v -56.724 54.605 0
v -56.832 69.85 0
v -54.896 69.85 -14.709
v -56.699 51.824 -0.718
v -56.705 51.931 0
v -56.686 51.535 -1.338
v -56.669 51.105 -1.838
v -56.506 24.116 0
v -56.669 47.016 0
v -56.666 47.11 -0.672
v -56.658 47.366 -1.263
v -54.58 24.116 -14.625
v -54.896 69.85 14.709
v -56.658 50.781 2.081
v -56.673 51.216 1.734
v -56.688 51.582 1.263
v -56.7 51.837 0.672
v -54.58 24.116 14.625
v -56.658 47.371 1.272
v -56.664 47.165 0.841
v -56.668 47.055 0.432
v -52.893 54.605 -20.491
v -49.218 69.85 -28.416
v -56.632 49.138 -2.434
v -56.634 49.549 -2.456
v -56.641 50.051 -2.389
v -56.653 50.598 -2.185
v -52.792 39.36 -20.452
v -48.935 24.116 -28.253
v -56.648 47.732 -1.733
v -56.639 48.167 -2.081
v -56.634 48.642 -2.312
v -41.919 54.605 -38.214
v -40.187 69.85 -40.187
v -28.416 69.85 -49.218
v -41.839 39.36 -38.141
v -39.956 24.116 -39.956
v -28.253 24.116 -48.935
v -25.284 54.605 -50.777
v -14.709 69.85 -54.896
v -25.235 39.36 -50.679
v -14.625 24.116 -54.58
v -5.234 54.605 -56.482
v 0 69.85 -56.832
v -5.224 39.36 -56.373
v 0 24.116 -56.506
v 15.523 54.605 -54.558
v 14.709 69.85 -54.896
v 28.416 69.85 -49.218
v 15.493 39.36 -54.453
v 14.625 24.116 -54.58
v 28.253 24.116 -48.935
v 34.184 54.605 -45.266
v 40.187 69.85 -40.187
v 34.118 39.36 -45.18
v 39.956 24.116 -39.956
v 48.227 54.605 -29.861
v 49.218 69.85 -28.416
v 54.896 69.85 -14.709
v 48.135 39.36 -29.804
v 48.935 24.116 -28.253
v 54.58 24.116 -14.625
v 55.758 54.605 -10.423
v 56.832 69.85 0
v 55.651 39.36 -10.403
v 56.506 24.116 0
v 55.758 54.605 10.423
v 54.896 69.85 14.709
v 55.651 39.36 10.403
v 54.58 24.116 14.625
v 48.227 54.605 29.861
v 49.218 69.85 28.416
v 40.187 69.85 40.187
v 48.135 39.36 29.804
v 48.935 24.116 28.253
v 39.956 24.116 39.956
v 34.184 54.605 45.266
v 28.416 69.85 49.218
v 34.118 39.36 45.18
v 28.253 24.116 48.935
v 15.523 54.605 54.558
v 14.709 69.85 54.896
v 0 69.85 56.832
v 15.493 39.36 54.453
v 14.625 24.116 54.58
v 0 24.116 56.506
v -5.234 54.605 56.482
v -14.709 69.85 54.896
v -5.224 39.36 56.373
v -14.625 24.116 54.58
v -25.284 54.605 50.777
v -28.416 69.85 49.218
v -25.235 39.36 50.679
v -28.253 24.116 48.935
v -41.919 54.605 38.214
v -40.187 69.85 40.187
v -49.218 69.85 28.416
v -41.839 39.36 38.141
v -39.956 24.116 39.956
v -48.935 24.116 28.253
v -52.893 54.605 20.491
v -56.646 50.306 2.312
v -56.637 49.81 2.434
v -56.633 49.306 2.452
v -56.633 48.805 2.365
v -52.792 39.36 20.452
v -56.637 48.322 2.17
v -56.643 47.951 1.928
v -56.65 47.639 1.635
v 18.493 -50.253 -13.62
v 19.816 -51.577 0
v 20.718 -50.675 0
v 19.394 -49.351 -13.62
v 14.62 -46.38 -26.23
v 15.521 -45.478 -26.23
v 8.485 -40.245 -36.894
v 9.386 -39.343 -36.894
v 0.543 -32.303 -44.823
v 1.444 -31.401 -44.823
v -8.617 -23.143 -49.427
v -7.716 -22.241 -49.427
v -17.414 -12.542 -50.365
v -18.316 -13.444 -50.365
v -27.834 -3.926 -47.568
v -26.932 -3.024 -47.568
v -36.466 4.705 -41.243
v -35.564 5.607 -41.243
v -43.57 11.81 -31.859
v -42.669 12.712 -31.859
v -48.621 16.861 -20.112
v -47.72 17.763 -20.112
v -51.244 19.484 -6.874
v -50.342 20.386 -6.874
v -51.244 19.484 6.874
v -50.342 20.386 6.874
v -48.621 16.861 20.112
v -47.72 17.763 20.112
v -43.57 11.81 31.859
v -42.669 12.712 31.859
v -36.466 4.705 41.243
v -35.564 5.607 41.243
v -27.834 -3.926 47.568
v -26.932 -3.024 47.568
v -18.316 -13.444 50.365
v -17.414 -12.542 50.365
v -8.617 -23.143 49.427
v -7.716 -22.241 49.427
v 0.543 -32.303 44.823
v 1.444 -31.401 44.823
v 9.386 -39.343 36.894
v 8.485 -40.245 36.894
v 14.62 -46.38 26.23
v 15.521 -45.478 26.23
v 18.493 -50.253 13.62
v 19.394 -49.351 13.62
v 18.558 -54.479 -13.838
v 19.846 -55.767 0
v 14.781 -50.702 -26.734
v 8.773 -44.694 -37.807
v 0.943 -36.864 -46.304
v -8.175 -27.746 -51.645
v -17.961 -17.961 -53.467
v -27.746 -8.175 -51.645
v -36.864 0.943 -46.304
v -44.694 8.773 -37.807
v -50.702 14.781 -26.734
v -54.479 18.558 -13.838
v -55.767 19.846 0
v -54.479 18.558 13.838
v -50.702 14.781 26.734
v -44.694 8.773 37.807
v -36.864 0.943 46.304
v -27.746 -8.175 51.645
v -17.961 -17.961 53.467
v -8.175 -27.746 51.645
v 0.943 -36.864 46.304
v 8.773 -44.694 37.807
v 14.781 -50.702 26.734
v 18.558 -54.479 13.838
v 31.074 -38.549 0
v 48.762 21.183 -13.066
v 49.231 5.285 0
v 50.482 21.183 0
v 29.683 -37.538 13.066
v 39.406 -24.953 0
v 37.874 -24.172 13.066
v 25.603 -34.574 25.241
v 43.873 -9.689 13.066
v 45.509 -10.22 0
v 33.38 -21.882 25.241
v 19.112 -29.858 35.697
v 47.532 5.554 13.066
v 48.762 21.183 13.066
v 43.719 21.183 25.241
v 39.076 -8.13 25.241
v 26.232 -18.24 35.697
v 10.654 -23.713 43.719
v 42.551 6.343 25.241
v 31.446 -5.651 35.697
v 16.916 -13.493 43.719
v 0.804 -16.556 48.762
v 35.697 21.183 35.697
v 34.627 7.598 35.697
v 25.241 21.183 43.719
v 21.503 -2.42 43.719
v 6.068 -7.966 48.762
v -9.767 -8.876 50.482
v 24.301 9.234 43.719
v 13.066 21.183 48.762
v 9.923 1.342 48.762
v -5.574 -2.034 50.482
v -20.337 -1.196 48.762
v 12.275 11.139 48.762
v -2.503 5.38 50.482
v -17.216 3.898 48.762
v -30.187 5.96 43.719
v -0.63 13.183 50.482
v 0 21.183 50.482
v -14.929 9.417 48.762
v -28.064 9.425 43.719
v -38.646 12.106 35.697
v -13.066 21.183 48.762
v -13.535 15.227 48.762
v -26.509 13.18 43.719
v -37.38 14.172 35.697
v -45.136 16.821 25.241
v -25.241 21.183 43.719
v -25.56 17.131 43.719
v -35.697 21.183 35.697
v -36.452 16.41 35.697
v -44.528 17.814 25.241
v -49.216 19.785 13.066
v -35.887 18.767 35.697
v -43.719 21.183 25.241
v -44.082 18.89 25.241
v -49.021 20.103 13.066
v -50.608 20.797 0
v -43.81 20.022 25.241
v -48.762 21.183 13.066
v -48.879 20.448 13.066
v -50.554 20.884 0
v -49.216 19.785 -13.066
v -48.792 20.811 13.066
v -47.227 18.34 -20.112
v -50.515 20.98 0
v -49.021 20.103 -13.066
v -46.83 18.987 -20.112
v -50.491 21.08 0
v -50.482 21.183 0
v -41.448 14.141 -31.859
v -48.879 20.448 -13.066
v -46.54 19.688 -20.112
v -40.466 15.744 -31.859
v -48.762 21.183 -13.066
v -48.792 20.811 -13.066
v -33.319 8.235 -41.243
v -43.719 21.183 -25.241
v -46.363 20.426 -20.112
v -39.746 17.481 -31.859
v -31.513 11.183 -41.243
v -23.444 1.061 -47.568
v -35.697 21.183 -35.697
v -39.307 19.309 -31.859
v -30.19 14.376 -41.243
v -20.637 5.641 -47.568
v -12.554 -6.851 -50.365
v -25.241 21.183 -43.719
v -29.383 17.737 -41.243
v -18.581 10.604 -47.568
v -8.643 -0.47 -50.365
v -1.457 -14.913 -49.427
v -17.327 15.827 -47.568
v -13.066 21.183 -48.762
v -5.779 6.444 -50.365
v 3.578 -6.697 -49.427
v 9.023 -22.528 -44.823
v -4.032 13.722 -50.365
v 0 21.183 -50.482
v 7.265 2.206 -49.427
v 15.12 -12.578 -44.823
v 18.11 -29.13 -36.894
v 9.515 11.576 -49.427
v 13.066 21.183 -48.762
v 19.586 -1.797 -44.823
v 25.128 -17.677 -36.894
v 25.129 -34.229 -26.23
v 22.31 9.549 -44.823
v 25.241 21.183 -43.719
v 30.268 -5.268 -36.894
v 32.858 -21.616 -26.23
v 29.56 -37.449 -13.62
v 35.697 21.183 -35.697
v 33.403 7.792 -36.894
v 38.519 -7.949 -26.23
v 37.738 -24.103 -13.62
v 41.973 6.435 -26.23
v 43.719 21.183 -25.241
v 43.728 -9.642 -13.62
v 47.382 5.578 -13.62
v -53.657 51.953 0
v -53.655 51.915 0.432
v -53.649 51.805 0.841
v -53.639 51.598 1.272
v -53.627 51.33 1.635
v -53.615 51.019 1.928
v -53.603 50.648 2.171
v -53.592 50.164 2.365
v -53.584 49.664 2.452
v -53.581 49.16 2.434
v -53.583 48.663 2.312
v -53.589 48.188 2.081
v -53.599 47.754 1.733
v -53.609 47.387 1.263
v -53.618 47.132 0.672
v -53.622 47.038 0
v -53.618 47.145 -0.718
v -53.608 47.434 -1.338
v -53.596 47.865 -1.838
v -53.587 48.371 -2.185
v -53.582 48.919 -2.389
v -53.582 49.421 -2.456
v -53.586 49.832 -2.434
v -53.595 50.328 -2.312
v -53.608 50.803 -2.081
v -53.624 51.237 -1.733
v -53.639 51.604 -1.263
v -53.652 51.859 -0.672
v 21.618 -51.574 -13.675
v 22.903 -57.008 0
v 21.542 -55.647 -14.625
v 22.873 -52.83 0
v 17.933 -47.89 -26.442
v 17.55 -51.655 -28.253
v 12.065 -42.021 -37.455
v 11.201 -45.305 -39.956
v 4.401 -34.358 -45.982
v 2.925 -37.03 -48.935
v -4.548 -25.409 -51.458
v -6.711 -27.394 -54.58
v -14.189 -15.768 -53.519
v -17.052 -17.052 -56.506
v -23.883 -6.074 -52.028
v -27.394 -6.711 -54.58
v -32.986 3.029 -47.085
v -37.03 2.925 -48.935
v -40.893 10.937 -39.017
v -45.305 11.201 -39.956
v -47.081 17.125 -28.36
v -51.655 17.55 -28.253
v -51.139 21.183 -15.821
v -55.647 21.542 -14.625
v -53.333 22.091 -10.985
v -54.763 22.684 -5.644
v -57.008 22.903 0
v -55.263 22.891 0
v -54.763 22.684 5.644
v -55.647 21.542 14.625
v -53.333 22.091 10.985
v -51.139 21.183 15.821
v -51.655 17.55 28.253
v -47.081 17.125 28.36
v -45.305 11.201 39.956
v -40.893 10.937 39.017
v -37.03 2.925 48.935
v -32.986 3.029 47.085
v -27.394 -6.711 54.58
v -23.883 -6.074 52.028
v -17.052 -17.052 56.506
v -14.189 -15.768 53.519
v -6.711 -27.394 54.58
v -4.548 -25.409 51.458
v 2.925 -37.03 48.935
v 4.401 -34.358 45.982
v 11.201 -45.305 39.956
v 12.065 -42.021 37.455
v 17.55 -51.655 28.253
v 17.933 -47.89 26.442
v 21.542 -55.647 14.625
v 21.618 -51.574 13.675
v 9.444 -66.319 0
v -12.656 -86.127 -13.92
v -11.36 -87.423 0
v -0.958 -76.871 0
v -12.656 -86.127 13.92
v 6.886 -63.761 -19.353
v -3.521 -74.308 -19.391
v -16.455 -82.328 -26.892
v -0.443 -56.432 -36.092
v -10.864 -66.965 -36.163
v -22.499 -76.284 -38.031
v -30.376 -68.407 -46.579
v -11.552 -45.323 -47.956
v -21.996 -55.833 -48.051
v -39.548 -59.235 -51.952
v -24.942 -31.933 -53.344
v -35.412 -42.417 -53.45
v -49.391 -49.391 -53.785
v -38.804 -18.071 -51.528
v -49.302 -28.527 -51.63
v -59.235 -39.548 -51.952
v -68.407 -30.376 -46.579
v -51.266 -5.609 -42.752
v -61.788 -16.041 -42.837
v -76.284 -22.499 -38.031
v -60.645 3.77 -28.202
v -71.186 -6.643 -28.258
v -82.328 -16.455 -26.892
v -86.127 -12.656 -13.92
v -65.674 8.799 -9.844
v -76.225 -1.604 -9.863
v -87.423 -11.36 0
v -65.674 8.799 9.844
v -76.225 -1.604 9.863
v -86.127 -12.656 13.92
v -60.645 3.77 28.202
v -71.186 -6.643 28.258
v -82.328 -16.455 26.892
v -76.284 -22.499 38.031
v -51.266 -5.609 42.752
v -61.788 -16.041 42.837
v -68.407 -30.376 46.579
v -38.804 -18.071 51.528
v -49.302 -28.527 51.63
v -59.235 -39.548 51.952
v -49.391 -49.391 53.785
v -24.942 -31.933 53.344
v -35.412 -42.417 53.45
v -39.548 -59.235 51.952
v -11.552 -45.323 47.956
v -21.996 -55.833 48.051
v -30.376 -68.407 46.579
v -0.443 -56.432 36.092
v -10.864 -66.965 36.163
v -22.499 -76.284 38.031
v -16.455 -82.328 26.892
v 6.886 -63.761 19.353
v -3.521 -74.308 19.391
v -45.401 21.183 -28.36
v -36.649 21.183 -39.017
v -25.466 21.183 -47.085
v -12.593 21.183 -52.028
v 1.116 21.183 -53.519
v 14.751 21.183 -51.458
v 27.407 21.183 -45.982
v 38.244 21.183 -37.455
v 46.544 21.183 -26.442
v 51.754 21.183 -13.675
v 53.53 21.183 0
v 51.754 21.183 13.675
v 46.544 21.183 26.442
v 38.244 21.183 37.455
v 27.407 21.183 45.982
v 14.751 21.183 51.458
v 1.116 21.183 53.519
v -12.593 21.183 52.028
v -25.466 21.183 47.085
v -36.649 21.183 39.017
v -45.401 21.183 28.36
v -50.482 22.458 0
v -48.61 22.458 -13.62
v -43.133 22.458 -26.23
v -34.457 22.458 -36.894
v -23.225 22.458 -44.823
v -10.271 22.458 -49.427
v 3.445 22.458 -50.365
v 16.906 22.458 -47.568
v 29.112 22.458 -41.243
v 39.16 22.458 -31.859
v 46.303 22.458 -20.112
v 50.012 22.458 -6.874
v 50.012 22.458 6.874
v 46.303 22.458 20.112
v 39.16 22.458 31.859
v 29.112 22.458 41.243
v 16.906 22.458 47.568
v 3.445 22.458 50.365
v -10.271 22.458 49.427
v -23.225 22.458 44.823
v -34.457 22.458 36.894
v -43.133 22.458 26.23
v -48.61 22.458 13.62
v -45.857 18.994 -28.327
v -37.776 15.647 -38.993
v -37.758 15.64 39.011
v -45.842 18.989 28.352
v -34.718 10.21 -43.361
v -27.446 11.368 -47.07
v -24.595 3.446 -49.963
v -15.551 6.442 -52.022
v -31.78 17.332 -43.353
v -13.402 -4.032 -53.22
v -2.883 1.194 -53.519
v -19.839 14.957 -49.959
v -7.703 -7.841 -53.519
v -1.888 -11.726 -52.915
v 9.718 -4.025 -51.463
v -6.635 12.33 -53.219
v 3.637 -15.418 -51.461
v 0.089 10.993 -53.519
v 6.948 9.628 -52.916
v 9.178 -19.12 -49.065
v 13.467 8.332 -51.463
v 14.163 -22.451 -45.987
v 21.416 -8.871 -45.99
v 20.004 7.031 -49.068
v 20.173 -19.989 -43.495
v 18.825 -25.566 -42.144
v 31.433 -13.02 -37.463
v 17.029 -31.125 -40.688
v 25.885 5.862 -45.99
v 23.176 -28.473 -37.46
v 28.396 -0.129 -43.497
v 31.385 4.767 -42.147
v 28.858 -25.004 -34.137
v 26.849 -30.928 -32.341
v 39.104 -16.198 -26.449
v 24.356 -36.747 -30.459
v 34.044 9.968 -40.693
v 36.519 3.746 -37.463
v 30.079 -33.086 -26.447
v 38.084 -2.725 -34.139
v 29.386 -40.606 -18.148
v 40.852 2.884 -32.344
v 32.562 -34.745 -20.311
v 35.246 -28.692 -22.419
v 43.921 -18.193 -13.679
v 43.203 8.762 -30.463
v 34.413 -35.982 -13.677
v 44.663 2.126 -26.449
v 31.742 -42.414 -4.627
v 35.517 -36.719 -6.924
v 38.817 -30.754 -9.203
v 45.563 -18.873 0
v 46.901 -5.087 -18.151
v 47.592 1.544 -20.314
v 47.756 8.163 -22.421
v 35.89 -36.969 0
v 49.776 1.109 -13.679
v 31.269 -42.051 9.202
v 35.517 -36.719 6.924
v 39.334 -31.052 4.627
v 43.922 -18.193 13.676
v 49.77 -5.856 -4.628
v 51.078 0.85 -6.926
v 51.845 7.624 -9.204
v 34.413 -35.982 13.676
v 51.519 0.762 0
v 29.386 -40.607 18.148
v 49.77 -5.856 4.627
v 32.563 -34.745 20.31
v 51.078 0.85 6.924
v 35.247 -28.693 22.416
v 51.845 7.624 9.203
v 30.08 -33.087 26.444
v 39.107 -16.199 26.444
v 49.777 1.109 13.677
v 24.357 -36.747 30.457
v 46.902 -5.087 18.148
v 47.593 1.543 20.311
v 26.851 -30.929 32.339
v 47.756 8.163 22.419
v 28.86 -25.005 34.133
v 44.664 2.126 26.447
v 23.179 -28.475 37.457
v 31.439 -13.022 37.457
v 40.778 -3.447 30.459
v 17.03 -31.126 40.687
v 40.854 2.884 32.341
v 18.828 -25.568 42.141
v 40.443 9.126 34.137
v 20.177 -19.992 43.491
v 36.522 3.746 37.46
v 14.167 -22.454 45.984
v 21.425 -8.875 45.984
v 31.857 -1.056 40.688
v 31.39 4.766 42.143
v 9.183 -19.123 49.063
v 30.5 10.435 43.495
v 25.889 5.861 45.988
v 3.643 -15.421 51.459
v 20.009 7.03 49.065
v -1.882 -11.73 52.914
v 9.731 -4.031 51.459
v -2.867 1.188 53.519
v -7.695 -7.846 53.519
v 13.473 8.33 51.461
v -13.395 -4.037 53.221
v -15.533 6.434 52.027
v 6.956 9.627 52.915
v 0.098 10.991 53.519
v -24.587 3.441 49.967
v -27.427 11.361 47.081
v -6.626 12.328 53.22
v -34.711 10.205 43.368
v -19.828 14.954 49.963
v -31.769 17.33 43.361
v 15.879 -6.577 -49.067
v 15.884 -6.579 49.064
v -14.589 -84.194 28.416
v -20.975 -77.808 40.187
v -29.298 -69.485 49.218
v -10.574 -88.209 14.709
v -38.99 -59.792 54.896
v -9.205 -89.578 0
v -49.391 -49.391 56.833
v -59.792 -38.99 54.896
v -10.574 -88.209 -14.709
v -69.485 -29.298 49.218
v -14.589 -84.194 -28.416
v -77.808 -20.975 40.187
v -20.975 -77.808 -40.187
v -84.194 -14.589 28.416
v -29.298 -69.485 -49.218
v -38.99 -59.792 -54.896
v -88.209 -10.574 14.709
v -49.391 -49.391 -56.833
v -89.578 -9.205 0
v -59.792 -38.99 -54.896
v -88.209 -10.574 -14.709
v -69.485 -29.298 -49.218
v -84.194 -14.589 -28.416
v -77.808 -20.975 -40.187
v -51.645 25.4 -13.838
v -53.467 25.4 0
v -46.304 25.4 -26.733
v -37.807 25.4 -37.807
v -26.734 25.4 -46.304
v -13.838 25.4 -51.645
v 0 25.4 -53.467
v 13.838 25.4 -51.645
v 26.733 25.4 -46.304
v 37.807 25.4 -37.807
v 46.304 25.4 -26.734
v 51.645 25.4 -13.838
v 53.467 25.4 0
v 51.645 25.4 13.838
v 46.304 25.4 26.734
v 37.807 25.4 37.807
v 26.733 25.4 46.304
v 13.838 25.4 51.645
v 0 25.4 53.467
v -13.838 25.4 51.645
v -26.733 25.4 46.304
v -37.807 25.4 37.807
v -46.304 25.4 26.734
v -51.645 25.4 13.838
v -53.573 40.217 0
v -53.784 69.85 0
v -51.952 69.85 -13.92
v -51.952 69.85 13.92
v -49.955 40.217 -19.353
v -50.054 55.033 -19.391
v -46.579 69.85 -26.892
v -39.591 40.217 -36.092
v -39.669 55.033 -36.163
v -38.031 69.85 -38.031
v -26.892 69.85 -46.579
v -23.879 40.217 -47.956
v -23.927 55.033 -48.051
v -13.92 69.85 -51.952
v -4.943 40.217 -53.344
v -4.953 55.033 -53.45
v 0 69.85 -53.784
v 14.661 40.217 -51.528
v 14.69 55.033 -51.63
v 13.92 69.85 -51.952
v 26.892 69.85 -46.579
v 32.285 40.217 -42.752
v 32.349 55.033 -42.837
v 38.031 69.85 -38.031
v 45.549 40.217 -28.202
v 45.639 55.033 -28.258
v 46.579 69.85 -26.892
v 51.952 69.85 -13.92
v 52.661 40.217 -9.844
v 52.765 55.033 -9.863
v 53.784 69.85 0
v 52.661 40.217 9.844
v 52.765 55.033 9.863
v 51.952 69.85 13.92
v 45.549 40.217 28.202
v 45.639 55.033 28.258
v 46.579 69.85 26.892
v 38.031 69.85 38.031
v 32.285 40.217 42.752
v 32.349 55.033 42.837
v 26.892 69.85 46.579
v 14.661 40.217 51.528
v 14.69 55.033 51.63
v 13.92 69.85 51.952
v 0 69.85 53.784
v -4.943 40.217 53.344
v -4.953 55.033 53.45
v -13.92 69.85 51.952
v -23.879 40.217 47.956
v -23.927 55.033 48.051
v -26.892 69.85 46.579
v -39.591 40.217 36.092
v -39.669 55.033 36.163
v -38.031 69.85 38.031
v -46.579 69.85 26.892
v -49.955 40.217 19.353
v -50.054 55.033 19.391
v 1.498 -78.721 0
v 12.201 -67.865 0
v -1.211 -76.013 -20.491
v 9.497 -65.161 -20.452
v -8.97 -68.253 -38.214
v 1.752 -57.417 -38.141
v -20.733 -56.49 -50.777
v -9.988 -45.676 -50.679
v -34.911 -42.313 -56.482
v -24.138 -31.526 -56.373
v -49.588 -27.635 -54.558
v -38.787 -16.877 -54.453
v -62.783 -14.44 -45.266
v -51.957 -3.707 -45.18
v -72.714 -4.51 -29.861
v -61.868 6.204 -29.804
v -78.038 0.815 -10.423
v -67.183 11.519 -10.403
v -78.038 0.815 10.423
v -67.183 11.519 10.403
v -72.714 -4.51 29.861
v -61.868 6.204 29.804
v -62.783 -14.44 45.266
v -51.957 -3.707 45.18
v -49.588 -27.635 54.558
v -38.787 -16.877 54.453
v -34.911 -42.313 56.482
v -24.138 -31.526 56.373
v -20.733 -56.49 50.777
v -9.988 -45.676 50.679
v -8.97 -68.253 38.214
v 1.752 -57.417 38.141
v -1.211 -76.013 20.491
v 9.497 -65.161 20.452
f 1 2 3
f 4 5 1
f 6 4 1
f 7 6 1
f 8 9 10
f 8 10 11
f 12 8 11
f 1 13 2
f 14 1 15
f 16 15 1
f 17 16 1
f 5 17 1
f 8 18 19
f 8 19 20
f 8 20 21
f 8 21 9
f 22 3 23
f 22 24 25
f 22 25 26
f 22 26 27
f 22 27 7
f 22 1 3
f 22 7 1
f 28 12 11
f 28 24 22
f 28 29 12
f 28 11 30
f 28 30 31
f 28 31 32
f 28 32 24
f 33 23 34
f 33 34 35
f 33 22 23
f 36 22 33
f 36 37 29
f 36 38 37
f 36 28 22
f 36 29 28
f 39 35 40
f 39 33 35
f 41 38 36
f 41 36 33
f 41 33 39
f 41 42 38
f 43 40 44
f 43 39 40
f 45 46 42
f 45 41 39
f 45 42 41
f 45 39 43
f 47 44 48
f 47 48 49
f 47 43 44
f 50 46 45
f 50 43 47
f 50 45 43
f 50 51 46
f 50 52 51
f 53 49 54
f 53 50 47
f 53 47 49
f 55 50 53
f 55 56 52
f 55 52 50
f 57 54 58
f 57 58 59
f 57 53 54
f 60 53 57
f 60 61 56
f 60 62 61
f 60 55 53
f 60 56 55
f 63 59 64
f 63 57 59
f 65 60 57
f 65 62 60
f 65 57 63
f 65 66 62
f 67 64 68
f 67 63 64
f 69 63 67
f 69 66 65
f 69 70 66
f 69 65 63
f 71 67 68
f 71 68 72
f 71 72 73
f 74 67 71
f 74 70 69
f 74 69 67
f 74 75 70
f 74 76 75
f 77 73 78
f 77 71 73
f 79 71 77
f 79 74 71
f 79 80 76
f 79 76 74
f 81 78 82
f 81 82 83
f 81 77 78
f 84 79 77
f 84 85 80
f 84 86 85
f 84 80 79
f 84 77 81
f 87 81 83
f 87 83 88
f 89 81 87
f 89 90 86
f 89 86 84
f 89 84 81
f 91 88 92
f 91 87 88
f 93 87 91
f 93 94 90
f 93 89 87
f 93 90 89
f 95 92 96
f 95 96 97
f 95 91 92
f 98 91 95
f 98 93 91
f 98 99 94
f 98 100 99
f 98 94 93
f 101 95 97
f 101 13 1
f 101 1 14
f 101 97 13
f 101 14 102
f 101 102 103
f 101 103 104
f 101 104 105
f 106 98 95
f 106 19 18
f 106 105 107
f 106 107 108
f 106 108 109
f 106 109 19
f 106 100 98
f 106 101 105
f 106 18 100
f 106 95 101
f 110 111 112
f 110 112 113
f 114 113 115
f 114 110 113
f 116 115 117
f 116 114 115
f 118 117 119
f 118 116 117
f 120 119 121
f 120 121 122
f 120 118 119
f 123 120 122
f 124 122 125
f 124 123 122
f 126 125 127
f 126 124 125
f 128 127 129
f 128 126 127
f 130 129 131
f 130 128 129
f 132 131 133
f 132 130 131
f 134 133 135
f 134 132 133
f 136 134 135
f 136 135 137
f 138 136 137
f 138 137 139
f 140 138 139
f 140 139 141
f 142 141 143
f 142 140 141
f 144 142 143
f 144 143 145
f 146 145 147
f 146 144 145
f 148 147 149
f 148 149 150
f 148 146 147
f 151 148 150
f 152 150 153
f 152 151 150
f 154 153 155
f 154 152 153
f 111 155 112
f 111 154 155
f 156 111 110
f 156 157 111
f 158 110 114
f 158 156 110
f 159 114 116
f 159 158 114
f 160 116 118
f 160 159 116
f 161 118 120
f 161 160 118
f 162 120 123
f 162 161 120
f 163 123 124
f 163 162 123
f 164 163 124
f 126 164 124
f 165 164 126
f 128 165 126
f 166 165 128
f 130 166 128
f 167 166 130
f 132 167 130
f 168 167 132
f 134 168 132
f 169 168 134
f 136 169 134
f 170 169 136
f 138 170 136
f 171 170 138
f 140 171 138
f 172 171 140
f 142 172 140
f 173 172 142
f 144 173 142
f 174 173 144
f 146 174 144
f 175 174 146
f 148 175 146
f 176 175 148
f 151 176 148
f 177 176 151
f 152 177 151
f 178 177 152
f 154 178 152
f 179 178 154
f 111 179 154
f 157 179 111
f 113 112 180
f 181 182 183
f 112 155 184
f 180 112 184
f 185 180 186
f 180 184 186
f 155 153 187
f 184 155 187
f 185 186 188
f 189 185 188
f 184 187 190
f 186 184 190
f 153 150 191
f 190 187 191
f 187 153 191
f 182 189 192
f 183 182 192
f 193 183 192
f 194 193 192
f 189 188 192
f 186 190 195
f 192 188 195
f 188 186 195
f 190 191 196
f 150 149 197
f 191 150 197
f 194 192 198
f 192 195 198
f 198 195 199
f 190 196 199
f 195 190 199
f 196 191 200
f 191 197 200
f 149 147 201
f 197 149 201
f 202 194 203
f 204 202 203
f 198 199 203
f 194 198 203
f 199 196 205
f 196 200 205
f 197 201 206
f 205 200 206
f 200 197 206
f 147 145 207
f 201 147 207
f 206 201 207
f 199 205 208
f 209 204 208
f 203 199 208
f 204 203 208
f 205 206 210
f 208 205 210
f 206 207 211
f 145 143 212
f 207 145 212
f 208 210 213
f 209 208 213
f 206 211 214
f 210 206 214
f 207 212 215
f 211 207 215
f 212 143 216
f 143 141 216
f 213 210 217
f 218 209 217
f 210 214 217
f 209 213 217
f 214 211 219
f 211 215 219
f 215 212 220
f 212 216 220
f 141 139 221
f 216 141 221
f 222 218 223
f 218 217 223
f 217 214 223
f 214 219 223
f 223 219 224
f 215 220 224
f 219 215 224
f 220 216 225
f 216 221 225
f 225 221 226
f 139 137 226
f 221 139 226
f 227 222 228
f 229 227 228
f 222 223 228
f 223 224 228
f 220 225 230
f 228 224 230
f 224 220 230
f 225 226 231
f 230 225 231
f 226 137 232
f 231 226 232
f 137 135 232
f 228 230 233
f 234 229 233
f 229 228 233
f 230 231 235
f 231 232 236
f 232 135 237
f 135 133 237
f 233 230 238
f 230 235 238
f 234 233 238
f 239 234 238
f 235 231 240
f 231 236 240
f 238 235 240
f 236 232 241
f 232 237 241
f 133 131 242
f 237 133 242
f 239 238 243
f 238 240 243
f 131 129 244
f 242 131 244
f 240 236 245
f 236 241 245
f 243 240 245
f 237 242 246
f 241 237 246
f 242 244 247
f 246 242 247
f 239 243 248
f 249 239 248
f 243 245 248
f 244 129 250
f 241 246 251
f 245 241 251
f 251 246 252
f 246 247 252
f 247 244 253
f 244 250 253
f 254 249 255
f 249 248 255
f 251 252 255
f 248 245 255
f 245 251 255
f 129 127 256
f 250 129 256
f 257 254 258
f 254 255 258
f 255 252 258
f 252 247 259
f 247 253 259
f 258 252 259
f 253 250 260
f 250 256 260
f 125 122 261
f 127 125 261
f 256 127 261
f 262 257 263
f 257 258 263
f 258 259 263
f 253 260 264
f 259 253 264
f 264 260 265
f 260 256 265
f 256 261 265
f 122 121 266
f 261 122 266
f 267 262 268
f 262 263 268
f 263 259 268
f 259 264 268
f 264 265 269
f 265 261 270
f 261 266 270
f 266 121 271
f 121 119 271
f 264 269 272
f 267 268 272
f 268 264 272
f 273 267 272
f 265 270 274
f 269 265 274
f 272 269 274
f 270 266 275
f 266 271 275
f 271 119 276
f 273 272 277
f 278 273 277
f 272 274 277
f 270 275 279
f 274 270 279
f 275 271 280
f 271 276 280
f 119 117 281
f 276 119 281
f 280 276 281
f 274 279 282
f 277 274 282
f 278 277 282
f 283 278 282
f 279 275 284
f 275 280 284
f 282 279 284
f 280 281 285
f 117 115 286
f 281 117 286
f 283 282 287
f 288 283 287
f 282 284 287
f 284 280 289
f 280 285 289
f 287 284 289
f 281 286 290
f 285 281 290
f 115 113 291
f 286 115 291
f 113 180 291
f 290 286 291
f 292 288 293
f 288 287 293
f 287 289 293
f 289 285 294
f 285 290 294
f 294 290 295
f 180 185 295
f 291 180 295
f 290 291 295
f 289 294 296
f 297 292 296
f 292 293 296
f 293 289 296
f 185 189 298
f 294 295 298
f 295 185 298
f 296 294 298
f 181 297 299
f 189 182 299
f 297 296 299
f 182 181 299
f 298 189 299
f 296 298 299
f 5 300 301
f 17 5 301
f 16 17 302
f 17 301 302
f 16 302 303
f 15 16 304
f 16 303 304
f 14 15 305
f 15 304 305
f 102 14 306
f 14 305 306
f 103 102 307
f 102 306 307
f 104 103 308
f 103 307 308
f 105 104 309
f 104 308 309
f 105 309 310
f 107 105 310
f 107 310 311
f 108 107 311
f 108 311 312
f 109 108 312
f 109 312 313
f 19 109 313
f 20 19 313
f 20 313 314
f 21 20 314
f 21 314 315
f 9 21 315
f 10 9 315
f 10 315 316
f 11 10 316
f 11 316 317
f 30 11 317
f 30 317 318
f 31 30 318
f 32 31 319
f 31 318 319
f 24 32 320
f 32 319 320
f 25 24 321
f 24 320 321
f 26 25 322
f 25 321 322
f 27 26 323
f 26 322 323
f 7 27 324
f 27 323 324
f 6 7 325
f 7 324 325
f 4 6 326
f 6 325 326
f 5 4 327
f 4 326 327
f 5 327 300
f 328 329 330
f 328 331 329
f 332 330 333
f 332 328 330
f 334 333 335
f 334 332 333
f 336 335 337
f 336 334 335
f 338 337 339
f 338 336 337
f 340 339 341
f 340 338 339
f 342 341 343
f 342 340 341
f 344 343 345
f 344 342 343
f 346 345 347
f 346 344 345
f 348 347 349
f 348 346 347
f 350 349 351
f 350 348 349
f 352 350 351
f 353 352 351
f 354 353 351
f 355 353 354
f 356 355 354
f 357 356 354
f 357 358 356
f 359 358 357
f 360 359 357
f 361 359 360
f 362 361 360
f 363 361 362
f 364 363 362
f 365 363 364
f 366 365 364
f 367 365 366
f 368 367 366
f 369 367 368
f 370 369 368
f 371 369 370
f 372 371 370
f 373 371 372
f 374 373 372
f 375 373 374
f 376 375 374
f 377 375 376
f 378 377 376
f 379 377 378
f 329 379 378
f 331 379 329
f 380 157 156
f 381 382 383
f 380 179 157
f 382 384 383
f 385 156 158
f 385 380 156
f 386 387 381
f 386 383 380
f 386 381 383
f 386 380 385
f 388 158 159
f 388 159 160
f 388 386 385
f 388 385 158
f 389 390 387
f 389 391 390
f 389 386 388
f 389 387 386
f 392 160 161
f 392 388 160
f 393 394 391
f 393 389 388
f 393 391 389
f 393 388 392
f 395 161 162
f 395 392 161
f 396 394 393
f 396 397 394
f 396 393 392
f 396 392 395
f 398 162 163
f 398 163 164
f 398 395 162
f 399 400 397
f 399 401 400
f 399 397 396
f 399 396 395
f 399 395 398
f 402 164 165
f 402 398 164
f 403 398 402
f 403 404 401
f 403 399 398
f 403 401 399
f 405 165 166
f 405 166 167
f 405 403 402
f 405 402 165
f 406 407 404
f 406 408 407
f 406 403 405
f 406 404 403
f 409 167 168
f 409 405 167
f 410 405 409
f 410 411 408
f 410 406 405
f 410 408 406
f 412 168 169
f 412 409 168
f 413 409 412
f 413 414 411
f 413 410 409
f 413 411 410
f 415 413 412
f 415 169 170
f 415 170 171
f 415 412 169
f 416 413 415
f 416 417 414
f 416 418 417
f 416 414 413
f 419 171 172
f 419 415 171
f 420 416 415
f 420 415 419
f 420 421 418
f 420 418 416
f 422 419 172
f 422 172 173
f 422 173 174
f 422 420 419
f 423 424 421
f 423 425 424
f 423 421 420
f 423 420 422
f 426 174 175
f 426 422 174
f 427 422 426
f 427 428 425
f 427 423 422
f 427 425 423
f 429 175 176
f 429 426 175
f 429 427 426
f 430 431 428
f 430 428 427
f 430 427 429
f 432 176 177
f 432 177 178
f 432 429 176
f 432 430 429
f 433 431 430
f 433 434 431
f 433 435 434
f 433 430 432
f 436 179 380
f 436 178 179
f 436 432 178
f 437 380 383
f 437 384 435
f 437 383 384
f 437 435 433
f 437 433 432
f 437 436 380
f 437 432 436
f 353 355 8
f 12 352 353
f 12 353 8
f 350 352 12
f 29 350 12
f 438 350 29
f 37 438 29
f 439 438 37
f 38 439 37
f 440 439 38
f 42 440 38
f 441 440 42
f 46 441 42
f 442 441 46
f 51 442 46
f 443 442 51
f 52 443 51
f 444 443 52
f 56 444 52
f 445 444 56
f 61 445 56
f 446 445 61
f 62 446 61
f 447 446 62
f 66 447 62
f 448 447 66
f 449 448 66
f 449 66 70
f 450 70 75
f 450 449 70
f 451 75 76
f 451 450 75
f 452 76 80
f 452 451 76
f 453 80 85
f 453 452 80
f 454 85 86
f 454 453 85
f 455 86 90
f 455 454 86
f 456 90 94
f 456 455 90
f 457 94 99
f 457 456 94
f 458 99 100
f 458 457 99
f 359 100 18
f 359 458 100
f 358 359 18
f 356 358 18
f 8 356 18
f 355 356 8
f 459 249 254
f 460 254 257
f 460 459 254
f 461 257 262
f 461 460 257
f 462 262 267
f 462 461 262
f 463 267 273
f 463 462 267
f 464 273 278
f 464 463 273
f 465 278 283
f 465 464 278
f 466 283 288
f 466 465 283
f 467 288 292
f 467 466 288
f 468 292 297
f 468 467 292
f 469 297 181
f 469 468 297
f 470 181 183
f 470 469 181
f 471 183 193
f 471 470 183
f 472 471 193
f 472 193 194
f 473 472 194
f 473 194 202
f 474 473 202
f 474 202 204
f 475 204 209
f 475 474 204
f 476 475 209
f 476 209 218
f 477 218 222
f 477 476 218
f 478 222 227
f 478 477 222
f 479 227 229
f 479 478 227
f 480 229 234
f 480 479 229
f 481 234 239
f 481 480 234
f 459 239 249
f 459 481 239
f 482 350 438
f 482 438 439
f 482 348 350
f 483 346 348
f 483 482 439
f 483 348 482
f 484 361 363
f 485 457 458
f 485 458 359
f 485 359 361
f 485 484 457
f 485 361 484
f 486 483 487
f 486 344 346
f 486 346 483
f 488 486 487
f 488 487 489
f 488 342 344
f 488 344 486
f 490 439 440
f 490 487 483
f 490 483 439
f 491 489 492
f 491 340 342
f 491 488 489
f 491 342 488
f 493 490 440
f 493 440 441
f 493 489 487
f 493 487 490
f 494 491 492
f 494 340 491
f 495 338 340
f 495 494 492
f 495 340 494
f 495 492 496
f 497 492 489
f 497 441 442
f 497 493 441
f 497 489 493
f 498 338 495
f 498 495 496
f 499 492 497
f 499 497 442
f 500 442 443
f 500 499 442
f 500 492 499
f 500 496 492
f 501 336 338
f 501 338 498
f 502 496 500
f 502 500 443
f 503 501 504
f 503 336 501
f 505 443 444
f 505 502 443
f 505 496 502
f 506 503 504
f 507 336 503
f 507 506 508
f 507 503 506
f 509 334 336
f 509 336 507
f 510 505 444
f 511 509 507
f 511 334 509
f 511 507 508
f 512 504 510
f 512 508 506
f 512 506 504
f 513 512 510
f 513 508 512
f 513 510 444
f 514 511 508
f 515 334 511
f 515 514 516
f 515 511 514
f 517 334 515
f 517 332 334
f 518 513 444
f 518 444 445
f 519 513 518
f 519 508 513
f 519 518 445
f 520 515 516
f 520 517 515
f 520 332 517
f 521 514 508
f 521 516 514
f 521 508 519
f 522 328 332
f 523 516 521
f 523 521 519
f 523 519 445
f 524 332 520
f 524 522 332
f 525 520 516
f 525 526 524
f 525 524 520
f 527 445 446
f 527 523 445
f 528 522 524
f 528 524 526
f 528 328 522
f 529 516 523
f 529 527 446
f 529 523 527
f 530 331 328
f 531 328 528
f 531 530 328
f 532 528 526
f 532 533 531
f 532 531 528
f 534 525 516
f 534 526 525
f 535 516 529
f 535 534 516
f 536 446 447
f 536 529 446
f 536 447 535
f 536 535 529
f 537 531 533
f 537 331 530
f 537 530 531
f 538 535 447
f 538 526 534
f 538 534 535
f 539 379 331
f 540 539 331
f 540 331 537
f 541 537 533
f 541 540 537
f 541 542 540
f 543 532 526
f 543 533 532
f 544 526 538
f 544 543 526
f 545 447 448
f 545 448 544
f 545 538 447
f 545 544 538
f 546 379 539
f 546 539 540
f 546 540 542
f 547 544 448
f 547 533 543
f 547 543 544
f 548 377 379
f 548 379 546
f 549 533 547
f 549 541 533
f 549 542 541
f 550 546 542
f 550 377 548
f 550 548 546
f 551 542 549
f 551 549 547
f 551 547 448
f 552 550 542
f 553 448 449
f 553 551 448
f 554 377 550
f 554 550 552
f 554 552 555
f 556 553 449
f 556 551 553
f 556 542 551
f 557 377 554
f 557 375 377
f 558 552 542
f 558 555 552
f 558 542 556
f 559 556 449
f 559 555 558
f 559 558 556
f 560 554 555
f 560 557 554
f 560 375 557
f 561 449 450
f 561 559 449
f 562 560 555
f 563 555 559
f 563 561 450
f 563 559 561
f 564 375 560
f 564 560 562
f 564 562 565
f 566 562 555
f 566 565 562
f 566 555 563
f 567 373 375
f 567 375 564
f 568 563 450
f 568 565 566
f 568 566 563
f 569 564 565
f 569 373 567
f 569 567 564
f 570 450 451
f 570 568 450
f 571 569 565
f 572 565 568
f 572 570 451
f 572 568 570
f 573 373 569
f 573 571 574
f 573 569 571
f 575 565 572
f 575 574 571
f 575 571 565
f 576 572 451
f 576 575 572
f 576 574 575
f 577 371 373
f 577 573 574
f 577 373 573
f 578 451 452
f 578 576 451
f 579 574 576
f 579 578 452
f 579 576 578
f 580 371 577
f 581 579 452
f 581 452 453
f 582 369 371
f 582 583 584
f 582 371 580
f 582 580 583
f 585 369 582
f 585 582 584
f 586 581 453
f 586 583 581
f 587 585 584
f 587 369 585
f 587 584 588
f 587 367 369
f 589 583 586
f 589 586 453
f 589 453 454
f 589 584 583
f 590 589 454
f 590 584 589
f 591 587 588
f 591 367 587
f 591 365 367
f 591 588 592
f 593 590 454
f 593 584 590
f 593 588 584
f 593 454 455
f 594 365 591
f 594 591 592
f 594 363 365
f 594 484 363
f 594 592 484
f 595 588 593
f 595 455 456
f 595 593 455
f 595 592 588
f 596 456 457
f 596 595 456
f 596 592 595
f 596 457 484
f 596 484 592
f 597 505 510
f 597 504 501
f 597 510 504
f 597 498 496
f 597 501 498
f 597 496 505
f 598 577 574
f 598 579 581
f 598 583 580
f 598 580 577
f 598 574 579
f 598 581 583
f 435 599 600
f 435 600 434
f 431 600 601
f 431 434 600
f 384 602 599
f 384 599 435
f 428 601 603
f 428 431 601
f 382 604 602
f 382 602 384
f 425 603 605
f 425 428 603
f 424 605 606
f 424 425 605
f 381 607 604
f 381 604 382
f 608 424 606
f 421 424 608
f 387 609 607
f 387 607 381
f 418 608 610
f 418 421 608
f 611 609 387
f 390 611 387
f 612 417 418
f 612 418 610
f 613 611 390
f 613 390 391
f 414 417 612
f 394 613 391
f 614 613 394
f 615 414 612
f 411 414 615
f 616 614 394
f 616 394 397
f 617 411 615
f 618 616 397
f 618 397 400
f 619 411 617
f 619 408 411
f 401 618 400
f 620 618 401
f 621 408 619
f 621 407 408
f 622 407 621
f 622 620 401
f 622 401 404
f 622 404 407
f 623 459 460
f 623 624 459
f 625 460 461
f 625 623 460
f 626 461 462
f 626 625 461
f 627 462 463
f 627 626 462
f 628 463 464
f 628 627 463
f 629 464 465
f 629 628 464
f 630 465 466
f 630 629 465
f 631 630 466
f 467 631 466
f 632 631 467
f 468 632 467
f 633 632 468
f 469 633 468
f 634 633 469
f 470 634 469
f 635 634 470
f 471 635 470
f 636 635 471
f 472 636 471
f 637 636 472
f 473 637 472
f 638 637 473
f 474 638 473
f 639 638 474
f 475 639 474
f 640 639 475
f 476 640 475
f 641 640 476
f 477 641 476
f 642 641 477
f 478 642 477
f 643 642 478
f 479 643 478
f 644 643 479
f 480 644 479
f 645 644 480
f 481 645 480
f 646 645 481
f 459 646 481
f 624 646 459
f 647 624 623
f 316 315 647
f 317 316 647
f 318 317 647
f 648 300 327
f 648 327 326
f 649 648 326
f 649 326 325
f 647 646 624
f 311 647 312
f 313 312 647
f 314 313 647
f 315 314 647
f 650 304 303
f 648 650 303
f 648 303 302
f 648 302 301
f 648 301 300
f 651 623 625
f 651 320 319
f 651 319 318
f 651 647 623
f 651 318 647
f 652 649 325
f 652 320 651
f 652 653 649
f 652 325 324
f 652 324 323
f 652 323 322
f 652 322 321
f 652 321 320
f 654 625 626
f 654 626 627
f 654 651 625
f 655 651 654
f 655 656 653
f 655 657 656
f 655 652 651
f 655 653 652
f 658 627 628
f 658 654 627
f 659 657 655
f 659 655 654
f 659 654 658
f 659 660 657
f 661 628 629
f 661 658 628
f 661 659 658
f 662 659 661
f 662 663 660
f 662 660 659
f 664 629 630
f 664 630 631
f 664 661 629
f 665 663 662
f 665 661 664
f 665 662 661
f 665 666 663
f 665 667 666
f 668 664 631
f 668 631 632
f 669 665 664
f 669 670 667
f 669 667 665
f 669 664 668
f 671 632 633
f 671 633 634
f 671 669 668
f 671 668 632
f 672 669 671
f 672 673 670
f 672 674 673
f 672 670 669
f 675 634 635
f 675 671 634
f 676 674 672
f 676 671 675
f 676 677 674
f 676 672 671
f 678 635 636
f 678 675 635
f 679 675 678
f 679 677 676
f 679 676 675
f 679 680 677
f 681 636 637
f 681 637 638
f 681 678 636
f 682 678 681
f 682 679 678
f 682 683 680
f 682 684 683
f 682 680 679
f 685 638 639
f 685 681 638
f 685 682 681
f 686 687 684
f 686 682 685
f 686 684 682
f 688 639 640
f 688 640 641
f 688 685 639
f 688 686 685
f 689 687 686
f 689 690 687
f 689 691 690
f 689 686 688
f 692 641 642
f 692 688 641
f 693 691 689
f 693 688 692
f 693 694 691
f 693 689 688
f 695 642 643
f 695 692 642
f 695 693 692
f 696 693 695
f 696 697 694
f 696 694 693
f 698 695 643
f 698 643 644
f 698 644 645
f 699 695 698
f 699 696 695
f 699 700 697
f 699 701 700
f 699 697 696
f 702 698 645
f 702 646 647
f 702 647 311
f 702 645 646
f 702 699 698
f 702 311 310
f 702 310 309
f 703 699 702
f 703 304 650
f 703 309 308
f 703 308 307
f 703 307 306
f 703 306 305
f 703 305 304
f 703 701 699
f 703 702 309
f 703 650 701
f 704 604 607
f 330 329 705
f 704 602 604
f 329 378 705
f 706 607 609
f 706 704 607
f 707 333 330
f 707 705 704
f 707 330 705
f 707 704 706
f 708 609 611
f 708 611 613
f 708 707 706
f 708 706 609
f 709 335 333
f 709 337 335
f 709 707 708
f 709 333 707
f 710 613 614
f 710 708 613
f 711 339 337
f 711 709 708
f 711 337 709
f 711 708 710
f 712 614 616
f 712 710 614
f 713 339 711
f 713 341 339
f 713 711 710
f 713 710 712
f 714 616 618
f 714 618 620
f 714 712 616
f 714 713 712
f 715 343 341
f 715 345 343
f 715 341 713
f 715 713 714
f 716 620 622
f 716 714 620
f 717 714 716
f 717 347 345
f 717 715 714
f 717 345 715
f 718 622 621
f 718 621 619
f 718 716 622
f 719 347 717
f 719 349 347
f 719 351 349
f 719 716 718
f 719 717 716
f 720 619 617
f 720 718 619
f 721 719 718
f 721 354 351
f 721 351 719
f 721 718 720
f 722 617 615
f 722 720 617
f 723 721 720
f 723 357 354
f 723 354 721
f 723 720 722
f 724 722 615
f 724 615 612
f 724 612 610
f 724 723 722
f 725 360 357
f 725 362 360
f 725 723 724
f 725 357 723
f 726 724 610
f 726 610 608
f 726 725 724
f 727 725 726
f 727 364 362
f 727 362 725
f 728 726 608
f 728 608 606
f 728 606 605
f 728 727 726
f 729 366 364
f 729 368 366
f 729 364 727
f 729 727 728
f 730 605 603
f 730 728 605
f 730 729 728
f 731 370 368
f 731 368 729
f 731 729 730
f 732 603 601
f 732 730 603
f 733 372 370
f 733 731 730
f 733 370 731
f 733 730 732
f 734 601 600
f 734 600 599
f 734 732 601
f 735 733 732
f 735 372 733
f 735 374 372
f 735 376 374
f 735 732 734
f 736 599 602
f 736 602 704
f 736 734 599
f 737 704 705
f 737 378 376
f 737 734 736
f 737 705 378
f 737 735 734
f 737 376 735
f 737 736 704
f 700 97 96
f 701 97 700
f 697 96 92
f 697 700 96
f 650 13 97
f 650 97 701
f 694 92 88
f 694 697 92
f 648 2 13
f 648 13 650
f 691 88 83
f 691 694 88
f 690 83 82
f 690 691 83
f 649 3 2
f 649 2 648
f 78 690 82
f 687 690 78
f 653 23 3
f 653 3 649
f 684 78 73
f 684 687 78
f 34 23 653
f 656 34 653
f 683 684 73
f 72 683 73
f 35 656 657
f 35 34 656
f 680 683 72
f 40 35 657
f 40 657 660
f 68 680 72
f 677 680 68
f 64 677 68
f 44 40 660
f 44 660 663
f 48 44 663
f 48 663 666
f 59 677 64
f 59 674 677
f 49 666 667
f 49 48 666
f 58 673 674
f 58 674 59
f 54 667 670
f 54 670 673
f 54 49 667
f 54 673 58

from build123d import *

# Parameters (mm, degrees)
SWEEP1_OUTLINE_R                 = 50.4825
SWEEP1_ANGLE                     = 45
F_10_0_1935_DIAMETER_HOLE1_D     = 4.9149
F_10_0_1935_DIAMETER_HOLE1_DEPTH = 76.2
F_10_0_1935_DIAMETER_HOLE1_TIP   = 1.476584928


# Read off the part's stored shape, not the designer's step: Sweep1
with BuildPart() as part:
    # Sketch1 → Revolve1 (revolve)
    with BuildSketch(Plane.XY):
        Polygon((-11.360023993, -87.422793339), (-9.204762524, -89.578054808), (22.903305281, -57.008000415), (22.873463107, -52.830095994), (20.718201637, -50.674834525), (19.81643184, -51.576604322), (19.846366028, -55.767390512), align=None)
    revolve(axis=Axis((-49.391408666, -49.391408666, 0), (0.707106781186549, 0.707106781186546, 0)))

    # Sketch2 → Revolve2 (revolve)
    with BuildSketch(Plane(origin=(0, 0, 0), x_dir=(-1, 0, 0), z_dir=(0, 0, -1)), mode=Mode.PRIVATE) as revolve2_sk:
        Polygon((-56.505826151, 24.1156612), (-53.5305, 21.182538256), (-50.4825, 21.182538256), (-50.4825, 22.457833333), (-53.467, 25.4), (-53.7845, 69.85), (-56.8325, 69.85), align=None)
    revolve(revolve2_sk.sketch.rotate(Axis((0, 69.85, 0), (0, -1, 0)), 180), axis=Axis((0, 69.85, 0), (0, -1, 0)))

    # Sweep1 outline → Sweep1 (revolve)
    with BuildSketch(Plane(origin=(-51.139171144, 21.182538256, 0), x_dir=(0.7071067811865458, -0.7071067811865492, 0), z_dir=(-0.7071067811865492, -0.7071067811865458, 0))):
        with BuildLine():
            add(Edge.make_bspline(
                [(0, -15.820859805), (3.386630847, -26.767767661), (10.25130148, -38.496554105), (21.767653092, -48.823978651), (37.04613395, -53.530499997), (58.423945129, -53.530500001), (65.508765494, -52.291102822), (71.965878454, -49.951324198), (77.591040871, -46.913712001), (89.454406147, -38.379551501), (96.226005165, -31.333524518), (101.848697911, -22.017553206), (107.472700853, 3.04e-07), (101.848697636, 22.017553663), (96.226004942, 31.333524749), (89.454406032, 38.379551584), (77.591040819, 46.913712039), (71.965878332, 49.951324264), (65.508765283, 52.291102899), (58.42394482, 53.530500055), (37.046133615, 53.530499893), (21.767652893, 48.823978477), (10.2513014, 38.496553967), (3.386630828, 26.767767599), (0, 15.820859805)],
                knots=[7.875906621, 7.875906621, 7.875906621, 7.875906621, 7.875906621, 7.875906621, 9.124748328, 9.124748328, 9.124748328, 9.124748328, 9.770281969, 9.770281969, 9.770281969, 9.770281969, 10.71746965, 10.71746965, 10.71746965, 11.664657316, 11.664657316, 11.664657316, 11.664657316, 12.310190963, 12.310190963, 12.310190963, 12.310190963, 13.559032663, 13.559032663, 13.559032663, 13.559032663, 13.559032663, 13.559032663], degree=5, weights=[1, 1, 0.991757982, 0.985412067, 1, 1, 0.999839694, 1.000222797, 1, 1, 0.999082466, 0.99680945, 1.00319055, 0.99680945, 0.999082467, 1, 1, 1.000222797, 0.999839694, 1, 1, 0.985412067, 0.991757982, 1, 1]))
            Line((0, 15.820859805), (0, -15.820859805))
        make_face()
        with Locations((51.139171144, 0)):
            Circle(SWEEP1_OUTLINE_R, mode=Mode.SUBTRACT)
    revolve(axis=Axis((-51.139171144, 21.182538256, 0), (0, 0, 1)), revolution_arc=SWEEP1_ANGLE)

    # #10 (0.1935) Diameter Hole1
    with Locations(Plane(origin=(-56.686954854, 49.473679541, 0), x_dir=(0.007142674934, -0.999974490772, 0), z_dir=(-0.999974490772, -0.007142674934, 0))):
        with Locations((0, 0)):
            Hole(F_10_0_1935_DIAMETER_HOLE1_D / 2, depth=F_10_0_1935_DIAMETER_HOLE1_DEPTH)
            with Locations((0, 0, -(F_10_0_1935_DIAMETER_HOLE1_DEPTH + F_10_0_1935_DIAMETER_HOLE1_TIP / 2))):  # 118° drill point
                Cone(0, F_10_0_1935_DIAMETER_HOLE1_D / 2, F_10_0_1935_DIAMETER_HOLE1_TIP, mode=Mode.SUBTRACT)


solid = part.part
